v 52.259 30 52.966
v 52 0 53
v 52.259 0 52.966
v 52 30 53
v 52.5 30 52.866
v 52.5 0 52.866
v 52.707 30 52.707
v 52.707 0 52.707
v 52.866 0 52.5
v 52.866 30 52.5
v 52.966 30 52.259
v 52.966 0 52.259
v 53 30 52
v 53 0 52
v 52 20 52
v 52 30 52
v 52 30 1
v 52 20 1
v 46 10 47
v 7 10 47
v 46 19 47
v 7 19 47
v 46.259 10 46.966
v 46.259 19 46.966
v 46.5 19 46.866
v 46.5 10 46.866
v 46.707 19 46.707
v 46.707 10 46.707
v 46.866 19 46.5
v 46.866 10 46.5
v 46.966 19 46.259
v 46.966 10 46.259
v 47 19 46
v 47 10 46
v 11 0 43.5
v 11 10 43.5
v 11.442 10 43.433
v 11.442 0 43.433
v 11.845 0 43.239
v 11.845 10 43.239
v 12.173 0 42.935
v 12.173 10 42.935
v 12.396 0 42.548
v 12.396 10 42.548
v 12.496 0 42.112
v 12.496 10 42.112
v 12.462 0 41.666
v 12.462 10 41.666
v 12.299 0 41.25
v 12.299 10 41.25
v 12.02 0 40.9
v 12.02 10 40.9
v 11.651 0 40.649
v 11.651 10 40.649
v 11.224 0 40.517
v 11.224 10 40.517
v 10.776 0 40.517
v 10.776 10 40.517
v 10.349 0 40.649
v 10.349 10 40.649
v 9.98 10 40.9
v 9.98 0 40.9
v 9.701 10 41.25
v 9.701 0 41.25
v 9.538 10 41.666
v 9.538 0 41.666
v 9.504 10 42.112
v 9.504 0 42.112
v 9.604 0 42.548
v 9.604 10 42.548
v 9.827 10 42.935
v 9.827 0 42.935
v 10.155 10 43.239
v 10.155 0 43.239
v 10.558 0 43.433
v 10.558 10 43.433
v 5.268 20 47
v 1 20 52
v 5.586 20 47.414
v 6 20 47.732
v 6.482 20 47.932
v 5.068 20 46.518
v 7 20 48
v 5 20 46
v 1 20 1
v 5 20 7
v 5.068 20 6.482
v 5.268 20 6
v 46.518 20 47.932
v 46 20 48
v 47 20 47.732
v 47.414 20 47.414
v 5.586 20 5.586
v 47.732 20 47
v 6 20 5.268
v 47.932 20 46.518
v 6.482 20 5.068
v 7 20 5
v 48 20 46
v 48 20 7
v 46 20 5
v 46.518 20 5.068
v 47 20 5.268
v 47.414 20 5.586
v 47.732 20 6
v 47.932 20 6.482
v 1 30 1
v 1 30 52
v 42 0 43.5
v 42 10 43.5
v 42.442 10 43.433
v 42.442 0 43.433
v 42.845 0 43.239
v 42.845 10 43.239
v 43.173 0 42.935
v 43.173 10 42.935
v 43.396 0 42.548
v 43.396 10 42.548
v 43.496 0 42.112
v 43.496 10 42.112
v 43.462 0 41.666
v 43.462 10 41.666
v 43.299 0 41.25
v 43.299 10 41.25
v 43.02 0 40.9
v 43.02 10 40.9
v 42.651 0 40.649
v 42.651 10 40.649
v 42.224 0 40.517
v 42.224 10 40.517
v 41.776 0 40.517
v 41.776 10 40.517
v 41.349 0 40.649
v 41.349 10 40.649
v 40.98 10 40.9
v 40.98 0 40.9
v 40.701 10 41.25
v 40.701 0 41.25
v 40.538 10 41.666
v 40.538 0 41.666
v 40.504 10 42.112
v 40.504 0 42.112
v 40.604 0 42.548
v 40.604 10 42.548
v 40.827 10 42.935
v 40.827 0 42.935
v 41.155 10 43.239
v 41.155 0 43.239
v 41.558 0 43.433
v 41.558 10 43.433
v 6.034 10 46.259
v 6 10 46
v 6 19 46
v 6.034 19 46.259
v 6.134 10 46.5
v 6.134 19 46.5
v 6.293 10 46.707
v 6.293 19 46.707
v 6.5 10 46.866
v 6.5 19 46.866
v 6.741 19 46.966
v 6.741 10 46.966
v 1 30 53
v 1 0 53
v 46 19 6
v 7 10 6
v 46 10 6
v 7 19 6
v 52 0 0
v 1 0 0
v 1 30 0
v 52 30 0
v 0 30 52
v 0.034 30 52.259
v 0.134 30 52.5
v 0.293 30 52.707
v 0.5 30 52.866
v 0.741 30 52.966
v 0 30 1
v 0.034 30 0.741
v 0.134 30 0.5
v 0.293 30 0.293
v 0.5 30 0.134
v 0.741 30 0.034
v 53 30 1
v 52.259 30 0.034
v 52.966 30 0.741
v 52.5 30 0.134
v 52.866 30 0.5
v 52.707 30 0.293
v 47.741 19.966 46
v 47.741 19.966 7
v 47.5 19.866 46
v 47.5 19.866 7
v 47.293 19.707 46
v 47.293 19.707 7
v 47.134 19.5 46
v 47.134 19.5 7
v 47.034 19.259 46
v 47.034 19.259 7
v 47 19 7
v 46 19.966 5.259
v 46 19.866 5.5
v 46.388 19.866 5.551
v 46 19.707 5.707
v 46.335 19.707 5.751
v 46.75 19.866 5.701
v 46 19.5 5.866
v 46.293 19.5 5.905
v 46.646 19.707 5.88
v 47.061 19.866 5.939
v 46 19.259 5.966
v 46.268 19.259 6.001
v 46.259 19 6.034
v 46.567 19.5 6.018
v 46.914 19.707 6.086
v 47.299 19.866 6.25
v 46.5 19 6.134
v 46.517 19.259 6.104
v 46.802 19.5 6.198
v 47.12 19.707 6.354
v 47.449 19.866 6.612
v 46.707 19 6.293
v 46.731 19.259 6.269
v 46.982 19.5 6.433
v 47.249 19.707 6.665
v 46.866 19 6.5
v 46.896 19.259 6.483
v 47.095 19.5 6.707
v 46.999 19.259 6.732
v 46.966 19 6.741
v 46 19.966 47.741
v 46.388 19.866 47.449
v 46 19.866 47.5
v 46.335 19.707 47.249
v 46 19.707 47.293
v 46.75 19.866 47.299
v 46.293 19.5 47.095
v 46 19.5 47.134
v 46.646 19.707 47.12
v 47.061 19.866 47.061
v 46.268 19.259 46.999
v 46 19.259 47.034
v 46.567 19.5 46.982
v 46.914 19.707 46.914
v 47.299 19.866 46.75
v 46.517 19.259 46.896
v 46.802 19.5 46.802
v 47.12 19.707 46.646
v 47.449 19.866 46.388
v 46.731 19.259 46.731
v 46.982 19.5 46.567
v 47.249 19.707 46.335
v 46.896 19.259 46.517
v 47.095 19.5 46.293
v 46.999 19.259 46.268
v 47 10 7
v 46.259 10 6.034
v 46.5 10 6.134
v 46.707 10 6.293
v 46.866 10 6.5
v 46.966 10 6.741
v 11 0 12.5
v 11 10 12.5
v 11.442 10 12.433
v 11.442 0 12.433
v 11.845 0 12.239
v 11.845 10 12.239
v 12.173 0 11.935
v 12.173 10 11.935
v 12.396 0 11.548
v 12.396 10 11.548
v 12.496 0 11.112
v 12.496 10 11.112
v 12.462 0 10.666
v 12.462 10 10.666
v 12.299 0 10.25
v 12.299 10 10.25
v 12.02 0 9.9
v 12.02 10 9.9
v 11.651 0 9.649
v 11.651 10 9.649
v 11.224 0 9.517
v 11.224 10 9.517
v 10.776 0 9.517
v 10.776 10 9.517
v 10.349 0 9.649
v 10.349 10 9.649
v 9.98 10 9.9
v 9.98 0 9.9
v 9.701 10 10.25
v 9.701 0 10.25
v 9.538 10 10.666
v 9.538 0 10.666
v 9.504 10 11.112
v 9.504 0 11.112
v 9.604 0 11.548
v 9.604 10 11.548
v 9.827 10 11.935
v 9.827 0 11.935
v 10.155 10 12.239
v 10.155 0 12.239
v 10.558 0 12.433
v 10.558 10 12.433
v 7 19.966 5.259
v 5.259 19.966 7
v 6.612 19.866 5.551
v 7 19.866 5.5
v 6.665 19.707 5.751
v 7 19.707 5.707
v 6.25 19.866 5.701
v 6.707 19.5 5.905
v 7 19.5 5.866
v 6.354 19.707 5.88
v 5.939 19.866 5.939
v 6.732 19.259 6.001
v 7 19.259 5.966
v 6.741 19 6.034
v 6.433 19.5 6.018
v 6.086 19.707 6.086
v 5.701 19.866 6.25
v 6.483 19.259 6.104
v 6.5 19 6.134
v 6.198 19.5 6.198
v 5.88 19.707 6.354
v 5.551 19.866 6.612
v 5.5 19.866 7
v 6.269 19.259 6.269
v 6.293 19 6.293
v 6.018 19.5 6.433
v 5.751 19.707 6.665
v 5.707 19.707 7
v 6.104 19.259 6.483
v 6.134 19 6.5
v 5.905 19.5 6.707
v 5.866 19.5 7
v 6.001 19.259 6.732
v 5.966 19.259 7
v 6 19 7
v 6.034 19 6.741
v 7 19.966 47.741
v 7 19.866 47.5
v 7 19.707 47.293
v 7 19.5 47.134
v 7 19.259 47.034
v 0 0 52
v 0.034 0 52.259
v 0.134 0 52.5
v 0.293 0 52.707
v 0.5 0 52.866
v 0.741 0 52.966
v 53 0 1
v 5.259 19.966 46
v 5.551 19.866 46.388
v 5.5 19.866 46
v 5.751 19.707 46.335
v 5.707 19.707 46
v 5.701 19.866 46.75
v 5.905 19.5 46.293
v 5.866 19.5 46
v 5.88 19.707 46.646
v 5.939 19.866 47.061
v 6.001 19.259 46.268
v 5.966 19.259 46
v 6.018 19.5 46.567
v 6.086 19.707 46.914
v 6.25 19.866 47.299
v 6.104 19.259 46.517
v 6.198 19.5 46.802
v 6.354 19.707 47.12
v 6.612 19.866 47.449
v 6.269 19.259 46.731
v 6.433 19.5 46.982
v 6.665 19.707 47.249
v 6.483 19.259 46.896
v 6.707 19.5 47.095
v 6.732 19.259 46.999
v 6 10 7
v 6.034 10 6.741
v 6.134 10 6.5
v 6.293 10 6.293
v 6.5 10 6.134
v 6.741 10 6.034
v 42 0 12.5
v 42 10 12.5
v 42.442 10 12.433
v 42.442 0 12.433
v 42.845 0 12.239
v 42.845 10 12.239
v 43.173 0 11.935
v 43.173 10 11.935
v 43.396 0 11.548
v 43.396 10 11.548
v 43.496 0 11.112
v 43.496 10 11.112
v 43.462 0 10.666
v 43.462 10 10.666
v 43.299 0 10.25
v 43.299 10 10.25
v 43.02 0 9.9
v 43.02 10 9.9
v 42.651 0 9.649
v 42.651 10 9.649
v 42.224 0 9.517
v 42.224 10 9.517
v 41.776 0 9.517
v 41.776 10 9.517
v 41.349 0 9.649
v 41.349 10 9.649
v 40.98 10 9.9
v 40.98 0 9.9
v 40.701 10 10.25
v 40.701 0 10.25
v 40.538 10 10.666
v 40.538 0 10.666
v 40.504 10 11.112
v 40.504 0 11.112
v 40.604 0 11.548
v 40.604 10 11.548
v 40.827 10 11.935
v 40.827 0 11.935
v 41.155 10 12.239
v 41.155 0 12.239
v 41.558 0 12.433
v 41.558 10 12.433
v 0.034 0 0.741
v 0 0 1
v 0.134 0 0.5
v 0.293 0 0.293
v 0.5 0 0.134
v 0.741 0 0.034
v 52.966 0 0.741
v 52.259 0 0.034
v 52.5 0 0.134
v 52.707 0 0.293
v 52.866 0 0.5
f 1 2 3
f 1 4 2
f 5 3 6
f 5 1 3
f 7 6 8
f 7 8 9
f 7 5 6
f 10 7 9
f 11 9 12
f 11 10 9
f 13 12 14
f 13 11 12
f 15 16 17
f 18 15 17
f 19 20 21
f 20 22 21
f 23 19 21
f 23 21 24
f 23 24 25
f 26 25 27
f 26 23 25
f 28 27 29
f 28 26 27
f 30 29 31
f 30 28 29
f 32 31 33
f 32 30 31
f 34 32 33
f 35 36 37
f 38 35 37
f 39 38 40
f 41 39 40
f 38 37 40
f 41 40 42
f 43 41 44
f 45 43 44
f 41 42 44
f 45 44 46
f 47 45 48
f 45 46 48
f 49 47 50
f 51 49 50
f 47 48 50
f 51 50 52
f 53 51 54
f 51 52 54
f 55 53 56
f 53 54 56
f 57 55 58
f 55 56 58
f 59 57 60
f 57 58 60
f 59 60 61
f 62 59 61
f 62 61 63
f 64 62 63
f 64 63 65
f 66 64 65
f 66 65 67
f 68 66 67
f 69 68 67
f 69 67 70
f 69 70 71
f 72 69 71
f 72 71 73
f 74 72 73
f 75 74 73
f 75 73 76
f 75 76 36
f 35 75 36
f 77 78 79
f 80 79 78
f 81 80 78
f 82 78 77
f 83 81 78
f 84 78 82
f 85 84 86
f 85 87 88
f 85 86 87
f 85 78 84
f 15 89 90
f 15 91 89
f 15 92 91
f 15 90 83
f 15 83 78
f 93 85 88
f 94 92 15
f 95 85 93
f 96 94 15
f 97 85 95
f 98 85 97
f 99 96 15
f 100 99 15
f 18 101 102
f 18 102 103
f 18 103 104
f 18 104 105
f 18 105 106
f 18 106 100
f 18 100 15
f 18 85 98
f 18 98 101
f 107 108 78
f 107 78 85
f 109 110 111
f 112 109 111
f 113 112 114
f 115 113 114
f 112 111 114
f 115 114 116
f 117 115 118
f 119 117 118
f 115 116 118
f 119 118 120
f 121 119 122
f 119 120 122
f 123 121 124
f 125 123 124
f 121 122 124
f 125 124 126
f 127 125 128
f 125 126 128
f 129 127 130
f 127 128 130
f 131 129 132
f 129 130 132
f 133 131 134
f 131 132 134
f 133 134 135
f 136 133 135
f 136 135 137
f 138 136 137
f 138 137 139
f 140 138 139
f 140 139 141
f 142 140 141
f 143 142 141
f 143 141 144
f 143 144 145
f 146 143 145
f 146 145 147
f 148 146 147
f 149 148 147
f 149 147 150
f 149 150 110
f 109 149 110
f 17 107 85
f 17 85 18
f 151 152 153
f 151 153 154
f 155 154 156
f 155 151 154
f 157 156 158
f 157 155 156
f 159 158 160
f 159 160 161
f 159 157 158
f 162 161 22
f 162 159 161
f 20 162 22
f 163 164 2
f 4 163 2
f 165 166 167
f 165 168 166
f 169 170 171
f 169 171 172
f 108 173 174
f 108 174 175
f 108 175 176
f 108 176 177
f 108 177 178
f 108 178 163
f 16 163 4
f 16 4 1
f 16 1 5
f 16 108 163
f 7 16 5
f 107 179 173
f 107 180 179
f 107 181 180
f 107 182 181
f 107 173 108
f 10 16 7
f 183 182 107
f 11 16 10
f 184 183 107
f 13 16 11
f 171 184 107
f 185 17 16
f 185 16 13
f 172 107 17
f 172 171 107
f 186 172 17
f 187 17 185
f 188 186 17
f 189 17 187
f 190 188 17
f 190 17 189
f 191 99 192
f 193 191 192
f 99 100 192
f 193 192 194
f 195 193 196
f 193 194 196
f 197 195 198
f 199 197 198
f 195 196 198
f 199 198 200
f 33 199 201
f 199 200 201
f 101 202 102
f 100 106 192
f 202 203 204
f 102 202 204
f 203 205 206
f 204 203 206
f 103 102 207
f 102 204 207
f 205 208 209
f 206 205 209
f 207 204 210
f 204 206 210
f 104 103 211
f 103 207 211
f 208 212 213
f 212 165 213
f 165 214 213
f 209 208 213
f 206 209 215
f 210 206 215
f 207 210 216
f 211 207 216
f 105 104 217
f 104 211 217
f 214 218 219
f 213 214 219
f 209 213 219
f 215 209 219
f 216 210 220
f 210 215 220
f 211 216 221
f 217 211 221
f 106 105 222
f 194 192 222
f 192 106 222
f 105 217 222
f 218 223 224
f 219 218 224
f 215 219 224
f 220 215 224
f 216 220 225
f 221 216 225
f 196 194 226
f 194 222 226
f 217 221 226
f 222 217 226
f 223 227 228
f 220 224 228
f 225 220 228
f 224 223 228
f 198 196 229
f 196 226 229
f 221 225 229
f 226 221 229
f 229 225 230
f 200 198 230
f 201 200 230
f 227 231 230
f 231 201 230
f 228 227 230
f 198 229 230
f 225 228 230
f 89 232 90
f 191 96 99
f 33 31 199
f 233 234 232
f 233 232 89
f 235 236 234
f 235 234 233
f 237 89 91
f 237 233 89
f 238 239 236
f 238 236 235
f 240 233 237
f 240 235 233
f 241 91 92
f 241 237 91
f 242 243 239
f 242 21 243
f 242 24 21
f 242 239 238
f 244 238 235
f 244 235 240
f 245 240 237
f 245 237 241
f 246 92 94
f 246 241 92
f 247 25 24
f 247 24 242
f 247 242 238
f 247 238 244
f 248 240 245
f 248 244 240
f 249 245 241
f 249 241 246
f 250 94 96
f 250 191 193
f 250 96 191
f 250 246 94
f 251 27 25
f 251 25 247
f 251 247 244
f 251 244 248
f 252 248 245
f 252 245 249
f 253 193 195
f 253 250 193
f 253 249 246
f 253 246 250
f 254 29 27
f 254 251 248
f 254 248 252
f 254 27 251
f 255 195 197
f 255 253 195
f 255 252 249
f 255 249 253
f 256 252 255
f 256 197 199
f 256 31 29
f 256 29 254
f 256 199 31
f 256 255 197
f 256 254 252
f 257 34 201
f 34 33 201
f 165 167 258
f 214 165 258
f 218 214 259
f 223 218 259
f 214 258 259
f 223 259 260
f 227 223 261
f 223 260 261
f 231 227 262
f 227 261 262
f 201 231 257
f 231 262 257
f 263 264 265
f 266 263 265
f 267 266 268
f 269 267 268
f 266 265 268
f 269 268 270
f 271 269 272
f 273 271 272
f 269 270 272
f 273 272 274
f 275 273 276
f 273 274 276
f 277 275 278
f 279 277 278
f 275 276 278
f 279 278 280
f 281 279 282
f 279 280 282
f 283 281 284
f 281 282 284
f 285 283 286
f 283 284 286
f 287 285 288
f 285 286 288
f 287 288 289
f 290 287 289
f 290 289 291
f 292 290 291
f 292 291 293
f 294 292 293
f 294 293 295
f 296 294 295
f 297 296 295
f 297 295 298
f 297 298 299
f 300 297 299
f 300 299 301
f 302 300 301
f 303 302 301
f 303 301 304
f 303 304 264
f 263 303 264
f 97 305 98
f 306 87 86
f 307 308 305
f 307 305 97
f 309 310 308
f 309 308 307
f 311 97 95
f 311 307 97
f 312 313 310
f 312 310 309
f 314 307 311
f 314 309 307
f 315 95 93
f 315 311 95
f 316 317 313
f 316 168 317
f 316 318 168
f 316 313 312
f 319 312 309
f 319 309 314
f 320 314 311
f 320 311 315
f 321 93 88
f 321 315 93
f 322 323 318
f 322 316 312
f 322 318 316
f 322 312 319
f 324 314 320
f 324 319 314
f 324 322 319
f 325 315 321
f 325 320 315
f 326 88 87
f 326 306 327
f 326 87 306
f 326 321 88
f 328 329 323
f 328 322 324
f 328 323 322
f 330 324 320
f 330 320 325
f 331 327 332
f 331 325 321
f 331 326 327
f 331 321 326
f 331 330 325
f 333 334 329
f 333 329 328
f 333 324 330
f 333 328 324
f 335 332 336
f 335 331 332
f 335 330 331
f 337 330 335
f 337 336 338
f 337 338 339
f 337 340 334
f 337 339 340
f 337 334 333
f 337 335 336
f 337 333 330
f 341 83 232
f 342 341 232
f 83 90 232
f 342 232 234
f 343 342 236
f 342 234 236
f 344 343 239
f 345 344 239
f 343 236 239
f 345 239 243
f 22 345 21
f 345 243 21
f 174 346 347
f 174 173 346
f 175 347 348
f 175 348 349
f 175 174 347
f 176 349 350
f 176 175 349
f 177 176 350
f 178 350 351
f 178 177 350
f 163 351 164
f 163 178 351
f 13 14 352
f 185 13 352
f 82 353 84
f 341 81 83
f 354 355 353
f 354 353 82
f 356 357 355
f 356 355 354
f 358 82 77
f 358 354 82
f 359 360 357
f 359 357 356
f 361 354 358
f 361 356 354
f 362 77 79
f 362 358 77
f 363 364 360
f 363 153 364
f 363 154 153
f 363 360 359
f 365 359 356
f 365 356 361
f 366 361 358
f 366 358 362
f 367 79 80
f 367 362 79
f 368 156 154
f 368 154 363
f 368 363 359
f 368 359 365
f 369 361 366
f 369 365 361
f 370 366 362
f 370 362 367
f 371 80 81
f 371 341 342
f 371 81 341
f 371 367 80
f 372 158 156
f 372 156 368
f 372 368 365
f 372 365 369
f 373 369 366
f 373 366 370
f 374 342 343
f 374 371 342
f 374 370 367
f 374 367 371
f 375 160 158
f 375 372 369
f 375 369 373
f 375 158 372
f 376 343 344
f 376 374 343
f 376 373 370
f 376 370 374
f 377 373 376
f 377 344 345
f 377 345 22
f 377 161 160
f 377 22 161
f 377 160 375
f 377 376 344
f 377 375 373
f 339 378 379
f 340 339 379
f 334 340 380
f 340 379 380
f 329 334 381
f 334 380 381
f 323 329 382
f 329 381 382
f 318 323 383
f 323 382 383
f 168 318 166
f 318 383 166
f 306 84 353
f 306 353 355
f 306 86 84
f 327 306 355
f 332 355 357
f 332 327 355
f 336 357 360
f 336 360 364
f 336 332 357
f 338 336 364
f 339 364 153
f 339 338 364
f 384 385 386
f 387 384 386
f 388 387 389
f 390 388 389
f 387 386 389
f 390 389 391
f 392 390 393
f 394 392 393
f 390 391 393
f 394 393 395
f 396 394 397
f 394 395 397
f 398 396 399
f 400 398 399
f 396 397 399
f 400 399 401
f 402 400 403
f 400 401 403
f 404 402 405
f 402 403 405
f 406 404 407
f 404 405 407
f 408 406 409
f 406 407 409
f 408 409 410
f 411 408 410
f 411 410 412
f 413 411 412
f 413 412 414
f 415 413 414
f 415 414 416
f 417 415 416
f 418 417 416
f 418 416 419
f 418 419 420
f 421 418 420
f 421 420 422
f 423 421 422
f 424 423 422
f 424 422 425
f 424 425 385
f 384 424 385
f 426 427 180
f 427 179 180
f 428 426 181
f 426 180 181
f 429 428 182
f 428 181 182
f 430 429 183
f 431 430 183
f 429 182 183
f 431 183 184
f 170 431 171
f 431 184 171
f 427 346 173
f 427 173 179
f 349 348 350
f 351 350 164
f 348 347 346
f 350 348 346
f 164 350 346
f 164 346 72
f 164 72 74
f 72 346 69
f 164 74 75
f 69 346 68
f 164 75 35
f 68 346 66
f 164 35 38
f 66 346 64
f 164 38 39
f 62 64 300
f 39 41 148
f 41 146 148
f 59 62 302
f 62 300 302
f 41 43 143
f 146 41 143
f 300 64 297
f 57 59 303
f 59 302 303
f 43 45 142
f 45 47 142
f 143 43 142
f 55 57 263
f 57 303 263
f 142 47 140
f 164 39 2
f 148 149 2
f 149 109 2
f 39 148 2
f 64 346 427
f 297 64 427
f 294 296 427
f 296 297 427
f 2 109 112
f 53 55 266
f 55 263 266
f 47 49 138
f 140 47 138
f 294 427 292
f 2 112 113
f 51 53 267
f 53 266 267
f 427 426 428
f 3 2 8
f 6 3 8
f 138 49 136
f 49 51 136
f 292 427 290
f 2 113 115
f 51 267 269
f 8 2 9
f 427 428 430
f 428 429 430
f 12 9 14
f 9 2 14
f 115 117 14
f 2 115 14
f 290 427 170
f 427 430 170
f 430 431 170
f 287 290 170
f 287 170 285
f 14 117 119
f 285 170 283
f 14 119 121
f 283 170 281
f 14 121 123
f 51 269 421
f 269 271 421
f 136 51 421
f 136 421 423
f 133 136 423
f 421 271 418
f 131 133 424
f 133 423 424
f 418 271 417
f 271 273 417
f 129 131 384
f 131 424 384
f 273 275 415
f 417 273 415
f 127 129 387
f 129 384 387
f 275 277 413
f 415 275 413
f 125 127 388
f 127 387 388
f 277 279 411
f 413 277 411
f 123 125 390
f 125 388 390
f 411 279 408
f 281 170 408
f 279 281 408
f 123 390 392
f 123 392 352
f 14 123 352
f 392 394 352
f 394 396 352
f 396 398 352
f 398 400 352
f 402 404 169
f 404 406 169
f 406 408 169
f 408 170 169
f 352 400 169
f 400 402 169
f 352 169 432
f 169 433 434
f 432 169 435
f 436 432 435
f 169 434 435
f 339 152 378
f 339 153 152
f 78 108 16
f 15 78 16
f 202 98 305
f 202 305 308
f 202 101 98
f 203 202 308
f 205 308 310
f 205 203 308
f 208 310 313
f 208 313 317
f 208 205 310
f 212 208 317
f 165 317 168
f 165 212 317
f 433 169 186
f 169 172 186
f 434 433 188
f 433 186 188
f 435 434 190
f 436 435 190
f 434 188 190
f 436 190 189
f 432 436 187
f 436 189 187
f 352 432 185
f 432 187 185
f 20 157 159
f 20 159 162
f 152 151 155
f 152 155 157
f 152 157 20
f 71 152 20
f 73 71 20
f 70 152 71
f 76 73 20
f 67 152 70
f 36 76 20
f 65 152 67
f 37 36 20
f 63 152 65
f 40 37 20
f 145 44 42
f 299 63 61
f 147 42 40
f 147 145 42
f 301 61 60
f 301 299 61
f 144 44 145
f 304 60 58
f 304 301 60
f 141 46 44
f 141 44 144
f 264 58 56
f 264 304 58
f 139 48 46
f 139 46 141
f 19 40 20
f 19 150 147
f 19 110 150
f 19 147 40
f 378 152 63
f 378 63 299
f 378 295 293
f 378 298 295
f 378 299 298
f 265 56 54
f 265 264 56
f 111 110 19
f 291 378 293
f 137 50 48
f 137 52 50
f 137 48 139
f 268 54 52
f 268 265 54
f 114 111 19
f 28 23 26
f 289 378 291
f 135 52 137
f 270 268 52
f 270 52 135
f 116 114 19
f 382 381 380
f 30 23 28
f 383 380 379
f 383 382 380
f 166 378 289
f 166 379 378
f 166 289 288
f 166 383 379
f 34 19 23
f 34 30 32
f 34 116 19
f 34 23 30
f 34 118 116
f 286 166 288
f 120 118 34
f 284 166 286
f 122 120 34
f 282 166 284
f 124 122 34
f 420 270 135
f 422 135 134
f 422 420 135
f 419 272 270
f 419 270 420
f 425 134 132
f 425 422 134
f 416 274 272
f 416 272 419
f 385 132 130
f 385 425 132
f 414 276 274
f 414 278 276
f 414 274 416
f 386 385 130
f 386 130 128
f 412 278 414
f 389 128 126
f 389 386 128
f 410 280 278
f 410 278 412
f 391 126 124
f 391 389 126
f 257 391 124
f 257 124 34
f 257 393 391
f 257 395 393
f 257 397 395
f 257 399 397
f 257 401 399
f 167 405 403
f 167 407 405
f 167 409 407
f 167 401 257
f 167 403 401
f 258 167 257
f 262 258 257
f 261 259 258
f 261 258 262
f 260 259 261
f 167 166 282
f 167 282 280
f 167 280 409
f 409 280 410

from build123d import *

# Parameters (mm, degrees)
SKETCH1_W           = 53
SKETCH1_H           = 53
BOSS_EXTRUDE1_DEPTH = 30
SKETCH6_W           = 51
SKETCH6_H           = 51
CUT_EXTRUDE1_DEPTH  = 10
SKETCH7_W           = 41
SKETCH7_H           = 41
CUT_EXTRUDE2_DEPTH  = 10
SKETCH14_R          = 1.5
CUT_EXTRUDE4_DEPTH  = 78.575769413
FILLET1_R           = 1


with BuildPart() as part:
    # Sketch1 → Boss-Extrude1 (new body)
    with BuildSketch(Plane(origin=(0, 0, 0), x_dir=(1, 0, 0), z_dir=(0, 1, 0))):
        with Locations((26.5, -26.5)):
            Rectangle(SKETCH1_W, SKETCH1_H)
    extrude(amount=BOSS_EXTRUDE1_DEPTH)

    # Sketch6 → Cut-Extrude1 (cut)
    with BuildSketch(Plane(origin=(0, 30, 0), x_dir=(1, 0, 0), z_dir=(0, 1, 0))):
        with Locations((26.5, -26.5)):
            Rectangle(SKETCH6_W, SKETCH6_H)
    extrude(amount=-CUT_EXTRUDE1_DEPTH, mode=Mode.SUBTRACT)

    # Sketch7 → Cut-Extrude2 (cut)
    with BuildSketch(Plane(origin=(0, 20, 0), x_dir=(1, 0, 0), z_dir=(0, 1, 0))):
        with Locations((26.5, -26.5)):
            Rectangle(SKETCH7_W, SKETCH7_H)
    extrude(amount=-CUT_EXTRUDE2_DEPTH, mode=Mode.SUBTRACT)

    # Sketch14 → Cut-Extrude4 (cut, through all)
    with BuildSketch(Plane(origin=(0, 10, 0), x_dir=(1, 0, 0), z_dir=(0, 1, 0))):
        with Locations(Location((11, -11, 0), (0, 0, 270))):
            Circle(SKETCH14_R)
        with Locations(Location((42, -11, 0), (0, 0, 270))):
            Circle(SKETCH14_R)
        with Locations(Location((42, -42, 0), (0, 0, 270))):
            Circle(SKETCH14_R)
        with Locations(Location((11, -42, 0), (0, 0, 270))):
            Circle(SKETCH14_R)
    extrude(amount=-CUT_EXTRUDE4_DEPTH, mode=Mode.SUBTRACT)

    # Fillet1
    fillet1_edges = [part.edges().sort_by_distance(p)[0] for p in [
        (6, 15, 6),
        (47, 15, 6),
        (47, 15, 47),
        (6, 15, 47),
        (26.5, 20, 6),
        (6, 20, 26.5),
        (26.5, 20, 47),
        (47, 20, 26.5),
        (0, 15, 0),
        (53, 15, 0),
        (53, 15, 53),
        (0, 15, 53),
    ]]
    fillet(fillet1_edges, radius=FILLET1_R)


solid = part.part
